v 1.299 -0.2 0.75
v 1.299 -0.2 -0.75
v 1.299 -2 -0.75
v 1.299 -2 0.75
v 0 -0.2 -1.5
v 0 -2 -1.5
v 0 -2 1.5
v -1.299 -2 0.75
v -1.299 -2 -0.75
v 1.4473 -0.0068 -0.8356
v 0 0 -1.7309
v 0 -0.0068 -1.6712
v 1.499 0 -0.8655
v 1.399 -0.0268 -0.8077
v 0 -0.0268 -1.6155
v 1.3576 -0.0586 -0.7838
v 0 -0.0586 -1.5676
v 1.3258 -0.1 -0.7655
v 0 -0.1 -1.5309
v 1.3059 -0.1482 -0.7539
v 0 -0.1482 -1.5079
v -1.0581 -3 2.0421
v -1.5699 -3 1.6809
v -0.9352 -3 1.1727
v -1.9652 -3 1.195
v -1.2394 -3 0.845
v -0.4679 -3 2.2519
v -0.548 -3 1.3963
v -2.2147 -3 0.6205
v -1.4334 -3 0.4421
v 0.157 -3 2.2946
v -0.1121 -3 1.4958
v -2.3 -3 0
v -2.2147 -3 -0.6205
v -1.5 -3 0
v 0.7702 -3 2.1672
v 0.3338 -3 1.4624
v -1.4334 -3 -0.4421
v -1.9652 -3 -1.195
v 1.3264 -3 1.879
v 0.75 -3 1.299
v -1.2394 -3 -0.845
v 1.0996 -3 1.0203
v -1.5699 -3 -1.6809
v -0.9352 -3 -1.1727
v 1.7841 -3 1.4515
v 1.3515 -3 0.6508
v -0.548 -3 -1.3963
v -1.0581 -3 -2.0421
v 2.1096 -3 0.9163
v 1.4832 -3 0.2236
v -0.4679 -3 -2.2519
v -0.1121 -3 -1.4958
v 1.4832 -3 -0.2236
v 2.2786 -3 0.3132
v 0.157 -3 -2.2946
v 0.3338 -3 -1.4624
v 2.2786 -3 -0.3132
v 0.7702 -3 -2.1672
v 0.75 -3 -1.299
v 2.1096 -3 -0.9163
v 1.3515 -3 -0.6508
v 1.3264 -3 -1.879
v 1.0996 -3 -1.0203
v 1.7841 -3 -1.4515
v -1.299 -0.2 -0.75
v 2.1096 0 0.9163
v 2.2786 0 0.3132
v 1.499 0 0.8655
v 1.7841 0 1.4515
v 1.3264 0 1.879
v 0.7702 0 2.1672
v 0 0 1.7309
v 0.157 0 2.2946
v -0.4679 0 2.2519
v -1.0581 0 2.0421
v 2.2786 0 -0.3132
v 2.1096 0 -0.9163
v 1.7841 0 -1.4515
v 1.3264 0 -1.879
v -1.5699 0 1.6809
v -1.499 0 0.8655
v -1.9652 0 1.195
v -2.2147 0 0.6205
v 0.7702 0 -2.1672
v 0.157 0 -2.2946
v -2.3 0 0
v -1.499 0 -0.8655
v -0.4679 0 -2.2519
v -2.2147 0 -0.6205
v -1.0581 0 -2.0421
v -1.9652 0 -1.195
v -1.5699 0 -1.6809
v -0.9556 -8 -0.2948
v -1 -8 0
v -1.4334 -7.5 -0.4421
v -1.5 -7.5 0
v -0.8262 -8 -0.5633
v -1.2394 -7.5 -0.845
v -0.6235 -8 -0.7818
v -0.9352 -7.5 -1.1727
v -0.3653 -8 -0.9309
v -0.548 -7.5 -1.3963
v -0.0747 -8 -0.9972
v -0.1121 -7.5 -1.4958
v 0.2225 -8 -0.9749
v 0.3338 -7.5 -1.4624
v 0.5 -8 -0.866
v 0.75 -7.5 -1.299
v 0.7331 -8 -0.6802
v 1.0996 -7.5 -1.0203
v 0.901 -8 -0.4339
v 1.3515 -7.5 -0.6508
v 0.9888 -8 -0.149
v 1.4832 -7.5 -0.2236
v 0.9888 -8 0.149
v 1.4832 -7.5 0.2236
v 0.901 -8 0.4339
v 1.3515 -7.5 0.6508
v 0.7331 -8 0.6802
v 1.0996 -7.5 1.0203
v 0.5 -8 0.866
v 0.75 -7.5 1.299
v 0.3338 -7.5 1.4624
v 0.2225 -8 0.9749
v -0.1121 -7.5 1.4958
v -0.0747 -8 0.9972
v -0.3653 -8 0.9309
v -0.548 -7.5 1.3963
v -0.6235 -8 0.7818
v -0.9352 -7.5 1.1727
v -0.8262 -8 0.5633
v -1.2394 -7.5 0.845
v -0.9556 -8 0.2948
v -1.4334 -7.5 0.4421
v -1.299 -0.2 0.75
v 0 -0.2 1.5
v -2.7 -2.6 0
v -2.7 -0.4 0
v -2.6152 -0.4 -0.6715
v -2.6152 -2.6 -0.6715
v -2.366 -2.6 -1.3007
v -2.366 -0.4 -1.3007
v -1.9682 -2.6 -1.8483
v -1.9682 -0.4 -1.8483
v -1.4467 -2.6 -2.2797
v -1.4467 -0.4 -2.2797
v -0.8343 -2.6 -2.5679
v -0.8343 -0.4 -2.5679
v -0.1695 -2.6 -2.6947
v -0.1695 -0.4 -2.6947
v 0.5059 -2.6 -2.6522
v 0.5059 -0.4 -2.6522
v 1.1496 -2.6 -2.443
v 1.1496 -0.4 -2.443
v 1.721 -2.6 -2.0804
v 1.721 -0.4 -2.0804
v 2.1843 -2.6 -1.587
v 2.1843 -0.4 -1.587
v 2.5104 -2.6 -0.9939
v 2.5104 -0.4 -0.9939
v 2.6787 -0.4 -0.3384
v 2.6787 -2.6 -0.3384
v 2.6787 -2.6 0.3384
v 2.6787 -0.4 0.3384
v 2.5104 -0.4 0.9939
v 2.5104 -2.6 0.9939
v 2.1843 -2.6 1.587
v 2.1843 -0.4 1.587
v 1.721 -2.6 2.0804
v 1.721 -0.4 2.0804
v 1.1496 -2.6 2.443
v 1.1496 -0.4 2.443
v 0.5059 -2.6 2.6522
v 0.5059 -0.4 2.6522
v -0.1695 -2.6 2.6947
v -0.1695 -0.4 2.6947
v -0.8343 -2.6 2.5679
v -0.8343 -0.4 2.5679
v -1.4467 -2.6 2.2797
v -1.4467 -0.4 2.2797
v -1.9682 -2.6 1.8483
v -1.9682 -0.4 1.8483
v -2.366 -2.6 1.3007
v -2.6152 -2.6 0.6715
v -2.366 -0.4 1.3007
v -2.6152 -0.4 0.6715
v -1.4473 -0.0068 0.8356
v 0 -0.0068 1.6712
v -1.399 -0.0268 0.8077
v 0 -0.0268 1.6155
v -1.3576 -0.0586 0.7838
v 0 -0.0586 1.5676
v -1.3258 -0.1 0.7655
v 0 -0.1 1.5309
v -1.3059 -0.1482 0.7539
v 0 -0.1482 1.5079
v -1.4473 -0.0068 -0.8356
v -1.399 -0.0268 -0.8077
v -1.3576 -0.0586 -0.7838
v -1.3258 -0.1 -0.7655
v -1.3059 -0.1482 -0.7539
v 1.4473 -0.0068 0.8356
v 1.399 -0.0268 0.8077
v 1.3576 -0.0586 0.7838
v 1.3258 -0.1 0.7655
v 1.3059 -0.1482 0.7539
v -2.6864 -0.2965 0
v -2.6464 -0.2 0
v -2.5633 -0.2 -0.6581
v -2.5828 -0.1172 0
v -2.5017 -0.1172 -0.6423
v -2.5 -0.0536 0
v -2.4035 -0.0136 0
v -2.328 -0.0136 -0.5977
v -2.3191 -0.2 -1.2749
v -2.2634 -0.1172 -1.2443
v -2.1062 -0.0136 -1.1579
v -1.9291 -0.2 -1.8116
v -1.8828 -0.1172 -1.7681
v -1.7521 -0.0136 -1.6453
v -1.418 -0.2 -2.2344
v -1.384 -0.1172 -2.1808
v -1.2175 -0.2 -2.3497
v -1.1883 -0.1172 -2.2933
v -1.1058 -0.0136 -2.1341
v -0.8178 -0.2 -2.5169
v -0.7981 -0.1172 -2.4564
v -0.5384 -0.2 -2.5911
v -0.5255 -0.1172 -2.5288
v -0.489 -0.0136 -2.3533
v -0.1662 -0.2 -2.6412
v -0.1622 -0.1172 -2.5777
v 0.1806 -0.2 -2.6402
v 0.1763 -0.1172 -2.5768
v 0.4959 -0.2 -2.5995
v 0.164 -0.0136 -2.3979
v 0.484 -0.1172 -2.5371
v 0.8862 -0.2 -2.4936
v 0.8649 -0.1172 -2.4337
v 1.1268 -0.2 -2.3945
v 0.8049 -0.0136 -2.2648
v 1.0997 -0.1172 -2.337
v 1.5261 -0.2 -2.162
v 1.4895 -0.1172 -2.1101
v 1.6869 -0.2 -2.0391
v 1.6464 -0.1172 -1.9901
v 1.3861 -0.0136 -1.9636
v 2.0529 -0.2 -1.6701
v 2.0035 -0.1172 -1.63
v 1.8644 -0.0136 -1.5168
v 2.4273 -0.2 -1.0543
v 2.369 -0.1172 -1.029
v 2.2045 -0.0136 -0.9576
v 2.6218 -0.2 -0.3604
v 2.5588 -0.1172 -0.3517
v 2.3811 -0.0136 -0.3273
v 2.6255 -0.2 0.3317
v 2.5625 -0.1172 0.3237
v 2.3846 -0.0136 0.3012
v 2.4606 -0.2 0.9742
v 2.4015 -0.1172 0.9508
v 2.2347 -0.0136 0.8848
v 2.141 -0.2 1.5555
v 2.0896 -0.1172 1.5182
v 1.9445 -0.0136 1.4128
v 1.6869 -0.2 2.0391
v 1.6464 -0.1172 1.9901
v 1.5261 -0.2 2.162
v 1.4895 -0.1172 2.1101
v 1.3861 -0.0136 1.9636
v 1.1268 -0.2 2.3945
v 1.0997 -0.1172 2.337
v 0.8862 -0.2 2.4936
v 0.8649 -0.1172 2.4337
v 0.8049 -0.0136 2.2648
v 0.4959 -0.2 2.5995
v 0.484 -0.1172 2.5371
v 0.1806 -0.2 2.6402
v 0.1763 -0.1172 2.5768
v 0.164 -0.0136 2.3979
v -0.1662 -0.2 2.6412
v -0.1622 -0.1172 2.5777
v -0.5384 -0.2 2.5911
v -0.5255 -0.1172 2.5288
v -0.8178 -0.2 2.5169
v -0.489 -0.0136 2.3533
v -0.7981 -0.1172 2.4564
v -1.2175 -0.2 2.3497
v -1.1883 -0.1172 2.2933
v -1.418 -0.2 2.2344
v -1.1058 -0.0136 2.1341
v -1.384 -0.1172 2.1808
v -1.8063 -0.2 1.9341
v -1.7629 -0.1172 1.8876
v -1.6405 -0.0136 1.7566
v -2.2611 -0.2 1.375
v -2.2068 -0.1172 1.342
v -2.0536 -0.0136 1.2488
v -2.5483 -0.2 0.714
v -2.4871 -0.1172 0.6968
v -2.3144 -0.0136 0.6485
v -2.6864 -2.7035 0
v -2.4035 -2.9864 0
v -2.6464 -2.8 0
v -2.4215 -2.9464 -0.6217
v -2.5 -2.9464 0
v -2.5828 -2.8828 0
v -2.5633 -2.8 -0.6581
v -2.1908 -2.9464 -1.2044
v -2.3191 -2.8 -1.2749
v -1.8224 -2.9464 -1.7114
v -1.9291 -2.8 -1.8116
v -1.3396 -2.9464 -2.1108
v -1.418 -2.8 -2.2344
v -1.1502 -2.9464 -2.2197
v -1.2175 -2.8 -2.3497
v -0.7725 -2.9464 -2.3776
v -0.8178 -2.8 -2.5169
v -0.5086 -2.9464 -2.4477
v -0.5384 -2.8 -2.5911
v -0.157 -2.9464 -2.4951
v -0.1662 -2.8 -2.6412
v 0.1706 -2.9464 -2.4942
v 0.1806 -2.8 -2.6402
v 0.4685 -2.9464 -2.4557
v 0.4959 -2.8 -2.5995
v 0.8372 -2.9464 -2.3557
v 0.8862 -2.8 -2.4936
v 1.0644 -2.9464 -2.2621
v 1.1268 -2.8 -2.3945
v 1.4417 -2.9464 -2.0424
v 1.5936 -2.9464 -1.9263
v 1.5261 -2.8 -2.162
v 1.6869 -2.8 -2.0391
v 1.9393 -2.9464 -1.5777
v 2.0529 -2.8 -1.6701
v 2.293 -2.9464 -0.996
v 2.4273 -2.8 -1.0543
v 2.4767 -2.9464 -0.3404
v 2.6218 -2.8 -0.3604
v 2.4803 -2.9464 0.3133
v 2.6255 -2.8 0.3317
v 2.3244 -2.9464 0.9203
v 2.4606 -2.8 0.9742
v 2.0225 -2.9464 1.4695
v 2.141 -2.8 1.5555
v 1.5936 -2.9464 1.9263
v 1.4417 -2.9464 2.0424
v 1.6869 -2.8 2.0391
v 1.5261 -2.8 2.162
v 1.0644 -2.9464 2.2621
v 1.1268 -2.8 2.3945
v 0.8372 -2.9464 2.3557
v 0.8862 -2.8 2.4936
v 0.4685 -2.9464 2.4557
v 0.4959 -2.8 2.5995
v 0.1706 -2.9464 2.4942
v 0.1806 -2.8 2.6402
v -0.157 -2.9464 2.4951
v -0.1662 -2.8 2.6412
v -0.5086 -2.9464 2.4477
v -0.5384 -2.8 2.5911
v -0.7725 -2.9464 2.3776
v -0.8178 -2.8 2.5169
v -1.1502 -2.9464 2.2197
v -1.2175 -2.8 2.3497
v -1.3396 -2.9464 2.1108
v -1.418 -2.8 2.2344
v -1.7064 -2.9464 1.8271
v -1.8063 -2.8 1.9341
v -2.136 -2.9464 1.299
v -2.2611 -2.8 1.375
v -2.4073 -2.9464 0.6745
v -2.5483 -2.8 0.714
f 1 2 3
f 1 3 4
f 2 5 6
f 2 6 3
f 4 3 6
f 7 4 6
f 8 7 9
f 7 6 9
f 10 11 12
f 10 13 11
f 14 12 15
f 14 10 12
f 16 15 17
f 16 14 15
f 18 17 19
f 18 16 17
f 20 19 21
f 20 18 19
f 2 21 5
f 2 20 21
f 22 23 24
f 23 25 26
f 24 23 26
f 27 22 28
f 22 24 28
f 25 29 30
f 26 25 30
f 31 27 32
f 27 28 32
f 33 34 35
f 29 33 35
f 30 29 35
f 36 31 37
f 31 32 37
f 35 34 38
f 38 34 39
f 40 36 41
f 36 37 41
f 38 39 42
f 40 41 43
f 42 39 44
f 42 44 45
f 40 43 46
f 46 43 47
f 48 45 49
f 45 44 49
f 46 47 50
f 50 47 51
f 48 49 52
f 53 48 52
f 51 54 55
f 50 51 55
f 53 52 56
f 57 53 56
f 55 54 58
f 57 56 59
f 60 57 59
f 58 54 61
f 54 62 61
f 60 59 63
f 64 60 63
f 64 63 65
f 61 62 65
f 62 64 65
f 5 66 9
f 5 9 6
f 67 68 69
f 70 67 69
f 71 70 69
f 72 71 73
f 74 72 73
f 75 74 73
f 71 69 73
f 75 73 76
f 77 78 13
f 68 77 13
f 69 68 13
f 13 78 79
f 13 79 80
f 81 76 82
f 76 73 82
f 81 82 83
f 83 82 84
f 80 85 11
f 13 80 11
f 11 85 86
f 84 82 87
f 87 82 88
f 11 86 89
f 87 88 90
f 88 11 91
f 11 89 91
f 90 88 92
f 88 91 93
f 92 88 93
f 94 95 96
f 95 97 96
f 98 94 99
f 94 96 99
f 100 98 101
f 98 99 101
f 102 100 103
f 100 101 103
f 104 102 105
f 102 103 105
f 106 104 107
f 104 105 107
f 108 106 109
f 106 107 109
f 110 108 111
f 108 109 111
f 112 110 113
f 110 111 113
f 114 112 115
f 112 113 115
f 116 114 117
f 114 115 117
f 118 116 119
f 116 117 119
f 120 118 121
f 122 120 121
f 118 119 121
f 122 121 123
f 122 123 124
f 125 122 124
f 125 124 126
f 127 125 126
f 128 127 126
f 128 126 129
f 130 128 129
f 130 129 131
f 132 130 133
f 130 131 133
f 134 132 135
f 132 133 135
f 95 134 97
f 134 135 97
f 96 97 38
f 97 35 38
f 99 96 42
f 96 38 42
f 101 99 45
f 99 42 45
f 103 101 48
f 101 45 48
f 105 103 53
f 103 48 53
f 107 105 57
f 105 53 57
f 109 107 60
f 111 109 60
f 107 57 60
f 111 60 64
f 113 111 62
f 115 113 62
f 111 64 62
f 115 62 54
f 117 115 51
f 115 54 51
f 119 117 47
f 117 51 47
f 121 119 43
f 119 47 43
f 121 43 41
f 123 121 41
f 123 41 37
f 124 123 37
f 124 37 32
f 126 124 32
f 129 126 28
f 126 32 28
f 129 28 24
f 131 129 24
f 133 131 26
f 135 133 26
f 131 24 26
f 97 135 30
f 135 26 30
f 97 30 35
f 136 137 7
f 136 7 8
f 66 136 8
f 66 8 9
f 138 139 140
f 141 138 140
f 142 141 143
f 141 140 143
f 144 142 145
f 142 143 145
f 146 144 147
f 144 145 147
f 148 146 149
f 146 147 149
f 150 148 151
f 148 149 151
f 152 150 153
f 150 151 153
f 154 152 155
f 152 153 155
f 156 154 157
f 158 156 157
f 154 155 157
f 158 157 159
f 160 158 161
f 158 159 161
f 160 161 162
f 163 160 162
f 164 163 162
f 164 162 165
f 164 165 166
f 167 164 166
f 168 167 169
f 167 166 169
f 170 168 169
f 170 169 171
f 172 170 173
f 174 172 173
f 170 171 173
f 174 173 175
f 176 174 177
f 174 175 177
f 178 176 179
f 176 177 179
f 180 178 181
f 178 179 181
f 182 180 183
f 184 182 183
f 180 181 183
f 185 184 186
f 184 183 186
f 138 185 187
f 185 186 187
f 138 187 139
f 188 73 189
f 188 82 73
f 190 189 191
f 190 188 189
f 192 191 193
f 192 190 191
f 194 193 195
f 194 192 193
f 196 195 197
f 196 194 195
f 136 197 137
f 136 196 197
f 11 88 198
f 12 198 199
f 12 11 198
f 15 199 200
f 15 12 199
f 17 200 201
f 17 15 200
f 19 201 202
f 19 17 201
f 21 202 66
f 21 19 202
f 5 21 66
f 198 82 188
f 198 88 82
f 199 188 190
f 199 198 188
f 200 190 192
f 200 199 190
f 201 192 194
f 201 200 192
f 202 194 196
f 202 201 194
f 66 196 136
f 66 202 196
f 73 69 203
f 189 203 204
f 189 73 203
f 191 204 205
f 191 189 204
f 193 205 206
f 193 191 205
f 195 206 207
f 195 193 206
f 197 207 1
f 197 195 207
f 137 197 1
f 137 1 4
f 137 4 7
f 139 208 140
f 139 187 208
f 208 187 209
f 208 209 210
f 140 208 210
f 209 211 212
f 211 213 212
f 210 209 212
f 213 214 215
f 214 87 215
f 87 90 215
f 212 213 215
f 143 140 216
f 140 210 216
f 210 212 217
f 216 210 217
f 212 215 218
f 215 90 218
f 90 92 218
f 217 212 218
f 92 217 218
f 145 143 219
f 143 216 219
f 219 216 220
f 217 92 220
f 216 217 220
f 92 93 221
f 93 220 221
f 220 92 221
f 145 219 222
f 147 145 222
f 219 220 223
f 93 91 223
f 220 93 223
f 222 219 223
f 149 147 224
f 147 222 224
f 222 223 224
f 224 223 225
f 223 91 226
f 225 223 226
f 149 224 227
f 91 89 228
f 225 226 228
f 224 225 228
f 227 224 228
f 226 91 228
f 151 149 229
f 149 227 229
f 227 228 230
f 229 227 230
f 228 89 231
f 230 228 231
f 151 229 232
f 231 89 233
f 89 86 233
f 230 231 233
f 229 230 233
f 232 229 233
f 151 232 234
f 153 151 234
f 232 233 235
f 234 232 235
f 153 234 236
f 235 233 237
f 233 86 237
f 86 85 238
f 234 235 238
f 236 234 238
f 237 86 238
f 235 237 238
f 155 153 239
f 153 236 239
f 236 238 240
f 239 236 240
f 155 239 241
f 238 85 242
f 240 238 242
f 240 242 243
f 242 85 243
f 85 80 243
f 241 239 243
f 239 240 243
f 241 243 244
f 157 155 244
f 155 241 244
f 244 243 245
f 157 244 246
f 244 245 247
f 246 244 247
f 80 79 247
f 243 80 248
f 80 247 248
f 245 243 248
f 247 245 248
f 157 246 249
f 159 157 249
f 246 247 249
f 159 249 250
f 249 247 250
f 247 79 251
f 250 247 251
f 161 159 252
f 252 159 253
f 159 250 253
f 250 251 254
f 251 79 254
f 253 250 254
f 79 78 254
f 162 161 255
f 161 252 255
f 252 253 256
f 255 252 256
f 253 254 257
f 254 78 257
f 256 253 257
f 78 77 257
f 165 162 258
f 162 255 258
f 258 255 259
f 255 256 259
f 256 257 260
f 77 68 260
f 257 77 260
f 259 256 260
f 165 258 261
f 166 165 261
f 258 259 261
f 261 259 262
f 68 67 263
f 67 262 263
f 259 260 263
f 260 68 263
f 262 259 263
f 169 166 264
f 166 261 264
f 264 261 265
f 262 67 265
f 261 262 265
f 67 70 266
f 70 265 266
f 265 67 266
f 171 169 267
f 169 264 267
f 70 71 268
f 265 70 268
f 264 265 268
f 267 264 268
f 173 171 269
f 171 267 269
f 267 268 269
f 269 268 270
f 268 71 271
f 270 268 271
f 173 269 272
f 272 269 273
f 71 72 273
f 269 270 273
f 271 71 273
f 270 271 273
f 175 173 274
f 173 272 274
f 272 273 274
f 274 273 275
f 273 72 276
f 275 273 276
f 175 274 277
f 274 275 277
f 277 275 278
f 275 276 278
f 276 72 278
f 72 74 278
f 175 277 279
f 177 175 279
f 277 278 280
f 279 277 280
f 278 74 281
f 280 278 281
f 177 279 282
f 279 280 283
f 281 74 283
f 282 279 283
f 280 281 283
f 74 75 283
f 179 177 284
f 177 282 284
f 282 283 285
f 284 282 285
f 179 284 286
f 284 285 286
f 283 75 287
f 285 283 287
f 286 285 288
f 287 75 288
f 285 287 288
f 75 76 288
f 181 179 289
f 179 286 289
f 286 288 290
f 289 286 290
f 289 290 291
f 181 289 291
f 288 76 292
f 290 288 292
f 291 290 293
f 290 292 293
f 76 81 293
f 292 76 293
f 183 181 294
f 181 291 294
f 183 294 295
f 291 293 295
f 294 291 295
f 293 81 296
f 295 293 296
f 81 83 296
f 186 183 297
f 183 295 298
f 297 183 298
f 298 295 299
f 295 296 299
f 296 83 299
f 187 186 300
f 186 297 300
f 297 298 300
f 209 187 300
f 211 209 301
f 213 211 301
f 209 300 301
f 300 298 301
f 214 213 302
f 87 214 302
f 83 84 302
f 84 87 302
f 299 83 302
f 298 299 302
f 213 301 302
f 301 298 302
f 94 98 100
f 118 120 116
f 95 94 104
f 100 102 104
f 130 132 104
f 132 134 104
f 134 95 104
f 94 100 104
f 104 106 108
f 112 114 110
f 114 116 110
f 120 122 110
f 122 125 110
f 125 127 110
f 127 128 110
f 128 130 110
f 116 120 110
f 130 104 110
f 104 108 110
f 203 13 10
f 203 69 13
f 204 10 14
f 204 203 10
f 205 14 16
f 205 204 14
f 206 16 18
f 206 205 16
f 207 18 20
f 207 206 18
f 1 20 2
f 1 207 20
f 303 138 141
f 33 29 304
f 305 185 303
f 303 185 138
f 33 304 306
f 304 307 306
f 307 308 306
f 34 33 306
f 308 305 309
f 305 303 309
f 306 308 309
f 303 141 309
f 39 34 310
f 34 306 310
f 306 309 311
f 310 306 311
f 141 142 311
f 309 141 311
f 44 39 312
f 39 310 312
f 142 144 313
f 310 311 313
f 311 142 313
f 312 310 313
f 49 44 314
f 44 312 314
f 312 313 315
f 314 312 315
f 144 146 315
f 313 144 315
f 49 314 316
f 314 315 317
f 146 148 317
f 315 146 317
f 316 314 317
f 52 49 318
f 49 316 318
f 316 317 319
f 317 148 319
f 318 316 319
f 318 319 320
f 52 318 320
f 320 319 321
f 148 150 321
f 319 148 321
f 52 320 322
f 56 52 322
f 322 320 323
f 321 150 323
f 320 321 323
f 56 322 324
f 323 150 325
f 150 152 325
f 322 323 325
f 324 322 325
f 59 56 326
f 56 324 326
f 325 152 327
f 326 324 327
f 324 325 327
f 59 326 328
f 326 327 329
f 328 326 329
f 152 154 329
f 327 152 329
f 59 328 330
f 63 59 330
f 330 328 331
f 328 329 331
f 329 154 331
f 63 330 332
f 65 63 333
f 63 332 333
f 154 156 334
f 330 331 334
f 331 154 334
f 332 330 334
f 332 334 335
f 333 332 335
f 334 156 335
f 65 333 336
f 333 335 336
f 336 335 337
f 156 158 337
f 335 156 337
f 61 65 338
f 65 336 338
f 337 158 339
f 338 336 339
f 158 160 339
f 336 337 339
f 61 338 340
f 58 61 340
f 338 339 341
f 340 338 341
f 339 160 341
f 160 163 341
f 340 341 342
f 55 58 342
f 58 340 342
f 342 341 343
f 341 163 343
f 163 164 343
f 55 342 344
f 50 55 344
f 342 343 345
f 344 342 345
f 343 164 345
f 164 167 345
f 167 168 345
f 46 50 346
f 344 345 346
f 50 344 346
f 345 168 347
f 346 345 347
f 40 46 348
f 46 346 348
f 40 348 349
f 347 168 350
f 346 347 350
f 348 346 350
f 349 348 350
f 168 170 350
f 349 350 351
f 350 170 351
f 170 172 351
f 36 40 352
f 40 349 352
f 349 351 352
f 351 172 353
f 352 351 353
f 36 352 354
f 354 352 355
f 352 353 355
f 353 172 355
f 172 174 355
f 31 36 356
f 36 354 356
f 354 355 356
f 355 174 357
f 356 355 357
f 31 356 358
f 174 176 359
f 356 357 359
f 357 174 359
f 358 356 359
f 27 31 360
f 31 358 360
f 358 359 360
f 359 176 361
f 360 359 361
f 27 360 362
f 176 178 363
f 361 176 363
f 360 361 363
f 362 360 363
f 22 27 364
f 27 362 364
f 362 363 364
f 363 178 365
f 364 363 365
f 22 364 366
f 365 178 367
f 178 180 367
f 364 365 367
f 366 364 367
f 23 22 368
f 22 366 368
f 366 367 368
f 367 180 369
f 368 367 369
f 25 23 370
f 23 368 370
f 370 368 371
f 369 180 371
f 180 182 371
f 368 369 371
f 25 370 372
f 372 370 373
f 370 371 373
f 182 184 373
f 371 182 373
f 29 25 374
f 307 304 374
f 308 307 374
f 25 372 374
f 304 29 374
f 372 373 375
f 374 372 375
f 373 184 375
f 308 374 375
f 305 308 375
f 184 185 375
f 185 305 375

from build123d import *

# Parameters (mm, degrees)
SCHNITT_LINEAR_AUSTRAGEN1_DEPTH = 2
VERRUNDUNG1_R                   = 0.4
VERRUNDUNG2_R                   = 0.2


with BuildPart() as part:
    # Skizze1 → Rotation1 (revolve)
    with BuildSketch(Plane.XY):
        Polygon((0, 0), (0, -8), (-1, -8), (-1.5, -7.5), (-1.5, -3), (-2.7, -3), (-2.7, 0), align=None)
    revolve(axis=Axis((0, 0, 0), (0, -1, 0)))

    # Skizze2 → Schnitt-Linear austragen1 (cut)
    with BuildSketch(Plane(origin=(0, 0, 0), x_dir=(1, 0, 0), z_dir=(0, 1, 0))):
        Polygon((1.299038106, 0.75), (1.299038106, -0.75), (0, -1.5), (-1.299038106, -0.75), (-1.299038106, 0.75), (0, 1.5), align=None)
    extrude(amount=-SCHNITT_LINEAR_AUSTRAGEN1_DEPTH, mode=Mode.SUBTRACT)

    # Verrundung1
    verrundung1_edges = [part.edges().sort_by_distance(p)[0] for p in [
        (2.7, 0, 0),
        (2.7, -3, 0),
    ]]
    fillet(verrundung1_edges, radius=VERRUNDUNG1_R)

    # Verrundung2
    verrundung2_edges = [part.edges().sort_by_distance(p)[0] for p in [
        (0.649519053, 0, -1.125),
        (-0.649519053, 0, -1.125),
        (-1.299038106, 0, 0),
        (-0.649519053, 0, 1.125),
        (0.649519053, 0, 1.125),
        (1.299038106, 0, 0),
    ]]
    fillet(verrundung2_edges, radius=VERRUNDUNG2_R)


solid = part.part
